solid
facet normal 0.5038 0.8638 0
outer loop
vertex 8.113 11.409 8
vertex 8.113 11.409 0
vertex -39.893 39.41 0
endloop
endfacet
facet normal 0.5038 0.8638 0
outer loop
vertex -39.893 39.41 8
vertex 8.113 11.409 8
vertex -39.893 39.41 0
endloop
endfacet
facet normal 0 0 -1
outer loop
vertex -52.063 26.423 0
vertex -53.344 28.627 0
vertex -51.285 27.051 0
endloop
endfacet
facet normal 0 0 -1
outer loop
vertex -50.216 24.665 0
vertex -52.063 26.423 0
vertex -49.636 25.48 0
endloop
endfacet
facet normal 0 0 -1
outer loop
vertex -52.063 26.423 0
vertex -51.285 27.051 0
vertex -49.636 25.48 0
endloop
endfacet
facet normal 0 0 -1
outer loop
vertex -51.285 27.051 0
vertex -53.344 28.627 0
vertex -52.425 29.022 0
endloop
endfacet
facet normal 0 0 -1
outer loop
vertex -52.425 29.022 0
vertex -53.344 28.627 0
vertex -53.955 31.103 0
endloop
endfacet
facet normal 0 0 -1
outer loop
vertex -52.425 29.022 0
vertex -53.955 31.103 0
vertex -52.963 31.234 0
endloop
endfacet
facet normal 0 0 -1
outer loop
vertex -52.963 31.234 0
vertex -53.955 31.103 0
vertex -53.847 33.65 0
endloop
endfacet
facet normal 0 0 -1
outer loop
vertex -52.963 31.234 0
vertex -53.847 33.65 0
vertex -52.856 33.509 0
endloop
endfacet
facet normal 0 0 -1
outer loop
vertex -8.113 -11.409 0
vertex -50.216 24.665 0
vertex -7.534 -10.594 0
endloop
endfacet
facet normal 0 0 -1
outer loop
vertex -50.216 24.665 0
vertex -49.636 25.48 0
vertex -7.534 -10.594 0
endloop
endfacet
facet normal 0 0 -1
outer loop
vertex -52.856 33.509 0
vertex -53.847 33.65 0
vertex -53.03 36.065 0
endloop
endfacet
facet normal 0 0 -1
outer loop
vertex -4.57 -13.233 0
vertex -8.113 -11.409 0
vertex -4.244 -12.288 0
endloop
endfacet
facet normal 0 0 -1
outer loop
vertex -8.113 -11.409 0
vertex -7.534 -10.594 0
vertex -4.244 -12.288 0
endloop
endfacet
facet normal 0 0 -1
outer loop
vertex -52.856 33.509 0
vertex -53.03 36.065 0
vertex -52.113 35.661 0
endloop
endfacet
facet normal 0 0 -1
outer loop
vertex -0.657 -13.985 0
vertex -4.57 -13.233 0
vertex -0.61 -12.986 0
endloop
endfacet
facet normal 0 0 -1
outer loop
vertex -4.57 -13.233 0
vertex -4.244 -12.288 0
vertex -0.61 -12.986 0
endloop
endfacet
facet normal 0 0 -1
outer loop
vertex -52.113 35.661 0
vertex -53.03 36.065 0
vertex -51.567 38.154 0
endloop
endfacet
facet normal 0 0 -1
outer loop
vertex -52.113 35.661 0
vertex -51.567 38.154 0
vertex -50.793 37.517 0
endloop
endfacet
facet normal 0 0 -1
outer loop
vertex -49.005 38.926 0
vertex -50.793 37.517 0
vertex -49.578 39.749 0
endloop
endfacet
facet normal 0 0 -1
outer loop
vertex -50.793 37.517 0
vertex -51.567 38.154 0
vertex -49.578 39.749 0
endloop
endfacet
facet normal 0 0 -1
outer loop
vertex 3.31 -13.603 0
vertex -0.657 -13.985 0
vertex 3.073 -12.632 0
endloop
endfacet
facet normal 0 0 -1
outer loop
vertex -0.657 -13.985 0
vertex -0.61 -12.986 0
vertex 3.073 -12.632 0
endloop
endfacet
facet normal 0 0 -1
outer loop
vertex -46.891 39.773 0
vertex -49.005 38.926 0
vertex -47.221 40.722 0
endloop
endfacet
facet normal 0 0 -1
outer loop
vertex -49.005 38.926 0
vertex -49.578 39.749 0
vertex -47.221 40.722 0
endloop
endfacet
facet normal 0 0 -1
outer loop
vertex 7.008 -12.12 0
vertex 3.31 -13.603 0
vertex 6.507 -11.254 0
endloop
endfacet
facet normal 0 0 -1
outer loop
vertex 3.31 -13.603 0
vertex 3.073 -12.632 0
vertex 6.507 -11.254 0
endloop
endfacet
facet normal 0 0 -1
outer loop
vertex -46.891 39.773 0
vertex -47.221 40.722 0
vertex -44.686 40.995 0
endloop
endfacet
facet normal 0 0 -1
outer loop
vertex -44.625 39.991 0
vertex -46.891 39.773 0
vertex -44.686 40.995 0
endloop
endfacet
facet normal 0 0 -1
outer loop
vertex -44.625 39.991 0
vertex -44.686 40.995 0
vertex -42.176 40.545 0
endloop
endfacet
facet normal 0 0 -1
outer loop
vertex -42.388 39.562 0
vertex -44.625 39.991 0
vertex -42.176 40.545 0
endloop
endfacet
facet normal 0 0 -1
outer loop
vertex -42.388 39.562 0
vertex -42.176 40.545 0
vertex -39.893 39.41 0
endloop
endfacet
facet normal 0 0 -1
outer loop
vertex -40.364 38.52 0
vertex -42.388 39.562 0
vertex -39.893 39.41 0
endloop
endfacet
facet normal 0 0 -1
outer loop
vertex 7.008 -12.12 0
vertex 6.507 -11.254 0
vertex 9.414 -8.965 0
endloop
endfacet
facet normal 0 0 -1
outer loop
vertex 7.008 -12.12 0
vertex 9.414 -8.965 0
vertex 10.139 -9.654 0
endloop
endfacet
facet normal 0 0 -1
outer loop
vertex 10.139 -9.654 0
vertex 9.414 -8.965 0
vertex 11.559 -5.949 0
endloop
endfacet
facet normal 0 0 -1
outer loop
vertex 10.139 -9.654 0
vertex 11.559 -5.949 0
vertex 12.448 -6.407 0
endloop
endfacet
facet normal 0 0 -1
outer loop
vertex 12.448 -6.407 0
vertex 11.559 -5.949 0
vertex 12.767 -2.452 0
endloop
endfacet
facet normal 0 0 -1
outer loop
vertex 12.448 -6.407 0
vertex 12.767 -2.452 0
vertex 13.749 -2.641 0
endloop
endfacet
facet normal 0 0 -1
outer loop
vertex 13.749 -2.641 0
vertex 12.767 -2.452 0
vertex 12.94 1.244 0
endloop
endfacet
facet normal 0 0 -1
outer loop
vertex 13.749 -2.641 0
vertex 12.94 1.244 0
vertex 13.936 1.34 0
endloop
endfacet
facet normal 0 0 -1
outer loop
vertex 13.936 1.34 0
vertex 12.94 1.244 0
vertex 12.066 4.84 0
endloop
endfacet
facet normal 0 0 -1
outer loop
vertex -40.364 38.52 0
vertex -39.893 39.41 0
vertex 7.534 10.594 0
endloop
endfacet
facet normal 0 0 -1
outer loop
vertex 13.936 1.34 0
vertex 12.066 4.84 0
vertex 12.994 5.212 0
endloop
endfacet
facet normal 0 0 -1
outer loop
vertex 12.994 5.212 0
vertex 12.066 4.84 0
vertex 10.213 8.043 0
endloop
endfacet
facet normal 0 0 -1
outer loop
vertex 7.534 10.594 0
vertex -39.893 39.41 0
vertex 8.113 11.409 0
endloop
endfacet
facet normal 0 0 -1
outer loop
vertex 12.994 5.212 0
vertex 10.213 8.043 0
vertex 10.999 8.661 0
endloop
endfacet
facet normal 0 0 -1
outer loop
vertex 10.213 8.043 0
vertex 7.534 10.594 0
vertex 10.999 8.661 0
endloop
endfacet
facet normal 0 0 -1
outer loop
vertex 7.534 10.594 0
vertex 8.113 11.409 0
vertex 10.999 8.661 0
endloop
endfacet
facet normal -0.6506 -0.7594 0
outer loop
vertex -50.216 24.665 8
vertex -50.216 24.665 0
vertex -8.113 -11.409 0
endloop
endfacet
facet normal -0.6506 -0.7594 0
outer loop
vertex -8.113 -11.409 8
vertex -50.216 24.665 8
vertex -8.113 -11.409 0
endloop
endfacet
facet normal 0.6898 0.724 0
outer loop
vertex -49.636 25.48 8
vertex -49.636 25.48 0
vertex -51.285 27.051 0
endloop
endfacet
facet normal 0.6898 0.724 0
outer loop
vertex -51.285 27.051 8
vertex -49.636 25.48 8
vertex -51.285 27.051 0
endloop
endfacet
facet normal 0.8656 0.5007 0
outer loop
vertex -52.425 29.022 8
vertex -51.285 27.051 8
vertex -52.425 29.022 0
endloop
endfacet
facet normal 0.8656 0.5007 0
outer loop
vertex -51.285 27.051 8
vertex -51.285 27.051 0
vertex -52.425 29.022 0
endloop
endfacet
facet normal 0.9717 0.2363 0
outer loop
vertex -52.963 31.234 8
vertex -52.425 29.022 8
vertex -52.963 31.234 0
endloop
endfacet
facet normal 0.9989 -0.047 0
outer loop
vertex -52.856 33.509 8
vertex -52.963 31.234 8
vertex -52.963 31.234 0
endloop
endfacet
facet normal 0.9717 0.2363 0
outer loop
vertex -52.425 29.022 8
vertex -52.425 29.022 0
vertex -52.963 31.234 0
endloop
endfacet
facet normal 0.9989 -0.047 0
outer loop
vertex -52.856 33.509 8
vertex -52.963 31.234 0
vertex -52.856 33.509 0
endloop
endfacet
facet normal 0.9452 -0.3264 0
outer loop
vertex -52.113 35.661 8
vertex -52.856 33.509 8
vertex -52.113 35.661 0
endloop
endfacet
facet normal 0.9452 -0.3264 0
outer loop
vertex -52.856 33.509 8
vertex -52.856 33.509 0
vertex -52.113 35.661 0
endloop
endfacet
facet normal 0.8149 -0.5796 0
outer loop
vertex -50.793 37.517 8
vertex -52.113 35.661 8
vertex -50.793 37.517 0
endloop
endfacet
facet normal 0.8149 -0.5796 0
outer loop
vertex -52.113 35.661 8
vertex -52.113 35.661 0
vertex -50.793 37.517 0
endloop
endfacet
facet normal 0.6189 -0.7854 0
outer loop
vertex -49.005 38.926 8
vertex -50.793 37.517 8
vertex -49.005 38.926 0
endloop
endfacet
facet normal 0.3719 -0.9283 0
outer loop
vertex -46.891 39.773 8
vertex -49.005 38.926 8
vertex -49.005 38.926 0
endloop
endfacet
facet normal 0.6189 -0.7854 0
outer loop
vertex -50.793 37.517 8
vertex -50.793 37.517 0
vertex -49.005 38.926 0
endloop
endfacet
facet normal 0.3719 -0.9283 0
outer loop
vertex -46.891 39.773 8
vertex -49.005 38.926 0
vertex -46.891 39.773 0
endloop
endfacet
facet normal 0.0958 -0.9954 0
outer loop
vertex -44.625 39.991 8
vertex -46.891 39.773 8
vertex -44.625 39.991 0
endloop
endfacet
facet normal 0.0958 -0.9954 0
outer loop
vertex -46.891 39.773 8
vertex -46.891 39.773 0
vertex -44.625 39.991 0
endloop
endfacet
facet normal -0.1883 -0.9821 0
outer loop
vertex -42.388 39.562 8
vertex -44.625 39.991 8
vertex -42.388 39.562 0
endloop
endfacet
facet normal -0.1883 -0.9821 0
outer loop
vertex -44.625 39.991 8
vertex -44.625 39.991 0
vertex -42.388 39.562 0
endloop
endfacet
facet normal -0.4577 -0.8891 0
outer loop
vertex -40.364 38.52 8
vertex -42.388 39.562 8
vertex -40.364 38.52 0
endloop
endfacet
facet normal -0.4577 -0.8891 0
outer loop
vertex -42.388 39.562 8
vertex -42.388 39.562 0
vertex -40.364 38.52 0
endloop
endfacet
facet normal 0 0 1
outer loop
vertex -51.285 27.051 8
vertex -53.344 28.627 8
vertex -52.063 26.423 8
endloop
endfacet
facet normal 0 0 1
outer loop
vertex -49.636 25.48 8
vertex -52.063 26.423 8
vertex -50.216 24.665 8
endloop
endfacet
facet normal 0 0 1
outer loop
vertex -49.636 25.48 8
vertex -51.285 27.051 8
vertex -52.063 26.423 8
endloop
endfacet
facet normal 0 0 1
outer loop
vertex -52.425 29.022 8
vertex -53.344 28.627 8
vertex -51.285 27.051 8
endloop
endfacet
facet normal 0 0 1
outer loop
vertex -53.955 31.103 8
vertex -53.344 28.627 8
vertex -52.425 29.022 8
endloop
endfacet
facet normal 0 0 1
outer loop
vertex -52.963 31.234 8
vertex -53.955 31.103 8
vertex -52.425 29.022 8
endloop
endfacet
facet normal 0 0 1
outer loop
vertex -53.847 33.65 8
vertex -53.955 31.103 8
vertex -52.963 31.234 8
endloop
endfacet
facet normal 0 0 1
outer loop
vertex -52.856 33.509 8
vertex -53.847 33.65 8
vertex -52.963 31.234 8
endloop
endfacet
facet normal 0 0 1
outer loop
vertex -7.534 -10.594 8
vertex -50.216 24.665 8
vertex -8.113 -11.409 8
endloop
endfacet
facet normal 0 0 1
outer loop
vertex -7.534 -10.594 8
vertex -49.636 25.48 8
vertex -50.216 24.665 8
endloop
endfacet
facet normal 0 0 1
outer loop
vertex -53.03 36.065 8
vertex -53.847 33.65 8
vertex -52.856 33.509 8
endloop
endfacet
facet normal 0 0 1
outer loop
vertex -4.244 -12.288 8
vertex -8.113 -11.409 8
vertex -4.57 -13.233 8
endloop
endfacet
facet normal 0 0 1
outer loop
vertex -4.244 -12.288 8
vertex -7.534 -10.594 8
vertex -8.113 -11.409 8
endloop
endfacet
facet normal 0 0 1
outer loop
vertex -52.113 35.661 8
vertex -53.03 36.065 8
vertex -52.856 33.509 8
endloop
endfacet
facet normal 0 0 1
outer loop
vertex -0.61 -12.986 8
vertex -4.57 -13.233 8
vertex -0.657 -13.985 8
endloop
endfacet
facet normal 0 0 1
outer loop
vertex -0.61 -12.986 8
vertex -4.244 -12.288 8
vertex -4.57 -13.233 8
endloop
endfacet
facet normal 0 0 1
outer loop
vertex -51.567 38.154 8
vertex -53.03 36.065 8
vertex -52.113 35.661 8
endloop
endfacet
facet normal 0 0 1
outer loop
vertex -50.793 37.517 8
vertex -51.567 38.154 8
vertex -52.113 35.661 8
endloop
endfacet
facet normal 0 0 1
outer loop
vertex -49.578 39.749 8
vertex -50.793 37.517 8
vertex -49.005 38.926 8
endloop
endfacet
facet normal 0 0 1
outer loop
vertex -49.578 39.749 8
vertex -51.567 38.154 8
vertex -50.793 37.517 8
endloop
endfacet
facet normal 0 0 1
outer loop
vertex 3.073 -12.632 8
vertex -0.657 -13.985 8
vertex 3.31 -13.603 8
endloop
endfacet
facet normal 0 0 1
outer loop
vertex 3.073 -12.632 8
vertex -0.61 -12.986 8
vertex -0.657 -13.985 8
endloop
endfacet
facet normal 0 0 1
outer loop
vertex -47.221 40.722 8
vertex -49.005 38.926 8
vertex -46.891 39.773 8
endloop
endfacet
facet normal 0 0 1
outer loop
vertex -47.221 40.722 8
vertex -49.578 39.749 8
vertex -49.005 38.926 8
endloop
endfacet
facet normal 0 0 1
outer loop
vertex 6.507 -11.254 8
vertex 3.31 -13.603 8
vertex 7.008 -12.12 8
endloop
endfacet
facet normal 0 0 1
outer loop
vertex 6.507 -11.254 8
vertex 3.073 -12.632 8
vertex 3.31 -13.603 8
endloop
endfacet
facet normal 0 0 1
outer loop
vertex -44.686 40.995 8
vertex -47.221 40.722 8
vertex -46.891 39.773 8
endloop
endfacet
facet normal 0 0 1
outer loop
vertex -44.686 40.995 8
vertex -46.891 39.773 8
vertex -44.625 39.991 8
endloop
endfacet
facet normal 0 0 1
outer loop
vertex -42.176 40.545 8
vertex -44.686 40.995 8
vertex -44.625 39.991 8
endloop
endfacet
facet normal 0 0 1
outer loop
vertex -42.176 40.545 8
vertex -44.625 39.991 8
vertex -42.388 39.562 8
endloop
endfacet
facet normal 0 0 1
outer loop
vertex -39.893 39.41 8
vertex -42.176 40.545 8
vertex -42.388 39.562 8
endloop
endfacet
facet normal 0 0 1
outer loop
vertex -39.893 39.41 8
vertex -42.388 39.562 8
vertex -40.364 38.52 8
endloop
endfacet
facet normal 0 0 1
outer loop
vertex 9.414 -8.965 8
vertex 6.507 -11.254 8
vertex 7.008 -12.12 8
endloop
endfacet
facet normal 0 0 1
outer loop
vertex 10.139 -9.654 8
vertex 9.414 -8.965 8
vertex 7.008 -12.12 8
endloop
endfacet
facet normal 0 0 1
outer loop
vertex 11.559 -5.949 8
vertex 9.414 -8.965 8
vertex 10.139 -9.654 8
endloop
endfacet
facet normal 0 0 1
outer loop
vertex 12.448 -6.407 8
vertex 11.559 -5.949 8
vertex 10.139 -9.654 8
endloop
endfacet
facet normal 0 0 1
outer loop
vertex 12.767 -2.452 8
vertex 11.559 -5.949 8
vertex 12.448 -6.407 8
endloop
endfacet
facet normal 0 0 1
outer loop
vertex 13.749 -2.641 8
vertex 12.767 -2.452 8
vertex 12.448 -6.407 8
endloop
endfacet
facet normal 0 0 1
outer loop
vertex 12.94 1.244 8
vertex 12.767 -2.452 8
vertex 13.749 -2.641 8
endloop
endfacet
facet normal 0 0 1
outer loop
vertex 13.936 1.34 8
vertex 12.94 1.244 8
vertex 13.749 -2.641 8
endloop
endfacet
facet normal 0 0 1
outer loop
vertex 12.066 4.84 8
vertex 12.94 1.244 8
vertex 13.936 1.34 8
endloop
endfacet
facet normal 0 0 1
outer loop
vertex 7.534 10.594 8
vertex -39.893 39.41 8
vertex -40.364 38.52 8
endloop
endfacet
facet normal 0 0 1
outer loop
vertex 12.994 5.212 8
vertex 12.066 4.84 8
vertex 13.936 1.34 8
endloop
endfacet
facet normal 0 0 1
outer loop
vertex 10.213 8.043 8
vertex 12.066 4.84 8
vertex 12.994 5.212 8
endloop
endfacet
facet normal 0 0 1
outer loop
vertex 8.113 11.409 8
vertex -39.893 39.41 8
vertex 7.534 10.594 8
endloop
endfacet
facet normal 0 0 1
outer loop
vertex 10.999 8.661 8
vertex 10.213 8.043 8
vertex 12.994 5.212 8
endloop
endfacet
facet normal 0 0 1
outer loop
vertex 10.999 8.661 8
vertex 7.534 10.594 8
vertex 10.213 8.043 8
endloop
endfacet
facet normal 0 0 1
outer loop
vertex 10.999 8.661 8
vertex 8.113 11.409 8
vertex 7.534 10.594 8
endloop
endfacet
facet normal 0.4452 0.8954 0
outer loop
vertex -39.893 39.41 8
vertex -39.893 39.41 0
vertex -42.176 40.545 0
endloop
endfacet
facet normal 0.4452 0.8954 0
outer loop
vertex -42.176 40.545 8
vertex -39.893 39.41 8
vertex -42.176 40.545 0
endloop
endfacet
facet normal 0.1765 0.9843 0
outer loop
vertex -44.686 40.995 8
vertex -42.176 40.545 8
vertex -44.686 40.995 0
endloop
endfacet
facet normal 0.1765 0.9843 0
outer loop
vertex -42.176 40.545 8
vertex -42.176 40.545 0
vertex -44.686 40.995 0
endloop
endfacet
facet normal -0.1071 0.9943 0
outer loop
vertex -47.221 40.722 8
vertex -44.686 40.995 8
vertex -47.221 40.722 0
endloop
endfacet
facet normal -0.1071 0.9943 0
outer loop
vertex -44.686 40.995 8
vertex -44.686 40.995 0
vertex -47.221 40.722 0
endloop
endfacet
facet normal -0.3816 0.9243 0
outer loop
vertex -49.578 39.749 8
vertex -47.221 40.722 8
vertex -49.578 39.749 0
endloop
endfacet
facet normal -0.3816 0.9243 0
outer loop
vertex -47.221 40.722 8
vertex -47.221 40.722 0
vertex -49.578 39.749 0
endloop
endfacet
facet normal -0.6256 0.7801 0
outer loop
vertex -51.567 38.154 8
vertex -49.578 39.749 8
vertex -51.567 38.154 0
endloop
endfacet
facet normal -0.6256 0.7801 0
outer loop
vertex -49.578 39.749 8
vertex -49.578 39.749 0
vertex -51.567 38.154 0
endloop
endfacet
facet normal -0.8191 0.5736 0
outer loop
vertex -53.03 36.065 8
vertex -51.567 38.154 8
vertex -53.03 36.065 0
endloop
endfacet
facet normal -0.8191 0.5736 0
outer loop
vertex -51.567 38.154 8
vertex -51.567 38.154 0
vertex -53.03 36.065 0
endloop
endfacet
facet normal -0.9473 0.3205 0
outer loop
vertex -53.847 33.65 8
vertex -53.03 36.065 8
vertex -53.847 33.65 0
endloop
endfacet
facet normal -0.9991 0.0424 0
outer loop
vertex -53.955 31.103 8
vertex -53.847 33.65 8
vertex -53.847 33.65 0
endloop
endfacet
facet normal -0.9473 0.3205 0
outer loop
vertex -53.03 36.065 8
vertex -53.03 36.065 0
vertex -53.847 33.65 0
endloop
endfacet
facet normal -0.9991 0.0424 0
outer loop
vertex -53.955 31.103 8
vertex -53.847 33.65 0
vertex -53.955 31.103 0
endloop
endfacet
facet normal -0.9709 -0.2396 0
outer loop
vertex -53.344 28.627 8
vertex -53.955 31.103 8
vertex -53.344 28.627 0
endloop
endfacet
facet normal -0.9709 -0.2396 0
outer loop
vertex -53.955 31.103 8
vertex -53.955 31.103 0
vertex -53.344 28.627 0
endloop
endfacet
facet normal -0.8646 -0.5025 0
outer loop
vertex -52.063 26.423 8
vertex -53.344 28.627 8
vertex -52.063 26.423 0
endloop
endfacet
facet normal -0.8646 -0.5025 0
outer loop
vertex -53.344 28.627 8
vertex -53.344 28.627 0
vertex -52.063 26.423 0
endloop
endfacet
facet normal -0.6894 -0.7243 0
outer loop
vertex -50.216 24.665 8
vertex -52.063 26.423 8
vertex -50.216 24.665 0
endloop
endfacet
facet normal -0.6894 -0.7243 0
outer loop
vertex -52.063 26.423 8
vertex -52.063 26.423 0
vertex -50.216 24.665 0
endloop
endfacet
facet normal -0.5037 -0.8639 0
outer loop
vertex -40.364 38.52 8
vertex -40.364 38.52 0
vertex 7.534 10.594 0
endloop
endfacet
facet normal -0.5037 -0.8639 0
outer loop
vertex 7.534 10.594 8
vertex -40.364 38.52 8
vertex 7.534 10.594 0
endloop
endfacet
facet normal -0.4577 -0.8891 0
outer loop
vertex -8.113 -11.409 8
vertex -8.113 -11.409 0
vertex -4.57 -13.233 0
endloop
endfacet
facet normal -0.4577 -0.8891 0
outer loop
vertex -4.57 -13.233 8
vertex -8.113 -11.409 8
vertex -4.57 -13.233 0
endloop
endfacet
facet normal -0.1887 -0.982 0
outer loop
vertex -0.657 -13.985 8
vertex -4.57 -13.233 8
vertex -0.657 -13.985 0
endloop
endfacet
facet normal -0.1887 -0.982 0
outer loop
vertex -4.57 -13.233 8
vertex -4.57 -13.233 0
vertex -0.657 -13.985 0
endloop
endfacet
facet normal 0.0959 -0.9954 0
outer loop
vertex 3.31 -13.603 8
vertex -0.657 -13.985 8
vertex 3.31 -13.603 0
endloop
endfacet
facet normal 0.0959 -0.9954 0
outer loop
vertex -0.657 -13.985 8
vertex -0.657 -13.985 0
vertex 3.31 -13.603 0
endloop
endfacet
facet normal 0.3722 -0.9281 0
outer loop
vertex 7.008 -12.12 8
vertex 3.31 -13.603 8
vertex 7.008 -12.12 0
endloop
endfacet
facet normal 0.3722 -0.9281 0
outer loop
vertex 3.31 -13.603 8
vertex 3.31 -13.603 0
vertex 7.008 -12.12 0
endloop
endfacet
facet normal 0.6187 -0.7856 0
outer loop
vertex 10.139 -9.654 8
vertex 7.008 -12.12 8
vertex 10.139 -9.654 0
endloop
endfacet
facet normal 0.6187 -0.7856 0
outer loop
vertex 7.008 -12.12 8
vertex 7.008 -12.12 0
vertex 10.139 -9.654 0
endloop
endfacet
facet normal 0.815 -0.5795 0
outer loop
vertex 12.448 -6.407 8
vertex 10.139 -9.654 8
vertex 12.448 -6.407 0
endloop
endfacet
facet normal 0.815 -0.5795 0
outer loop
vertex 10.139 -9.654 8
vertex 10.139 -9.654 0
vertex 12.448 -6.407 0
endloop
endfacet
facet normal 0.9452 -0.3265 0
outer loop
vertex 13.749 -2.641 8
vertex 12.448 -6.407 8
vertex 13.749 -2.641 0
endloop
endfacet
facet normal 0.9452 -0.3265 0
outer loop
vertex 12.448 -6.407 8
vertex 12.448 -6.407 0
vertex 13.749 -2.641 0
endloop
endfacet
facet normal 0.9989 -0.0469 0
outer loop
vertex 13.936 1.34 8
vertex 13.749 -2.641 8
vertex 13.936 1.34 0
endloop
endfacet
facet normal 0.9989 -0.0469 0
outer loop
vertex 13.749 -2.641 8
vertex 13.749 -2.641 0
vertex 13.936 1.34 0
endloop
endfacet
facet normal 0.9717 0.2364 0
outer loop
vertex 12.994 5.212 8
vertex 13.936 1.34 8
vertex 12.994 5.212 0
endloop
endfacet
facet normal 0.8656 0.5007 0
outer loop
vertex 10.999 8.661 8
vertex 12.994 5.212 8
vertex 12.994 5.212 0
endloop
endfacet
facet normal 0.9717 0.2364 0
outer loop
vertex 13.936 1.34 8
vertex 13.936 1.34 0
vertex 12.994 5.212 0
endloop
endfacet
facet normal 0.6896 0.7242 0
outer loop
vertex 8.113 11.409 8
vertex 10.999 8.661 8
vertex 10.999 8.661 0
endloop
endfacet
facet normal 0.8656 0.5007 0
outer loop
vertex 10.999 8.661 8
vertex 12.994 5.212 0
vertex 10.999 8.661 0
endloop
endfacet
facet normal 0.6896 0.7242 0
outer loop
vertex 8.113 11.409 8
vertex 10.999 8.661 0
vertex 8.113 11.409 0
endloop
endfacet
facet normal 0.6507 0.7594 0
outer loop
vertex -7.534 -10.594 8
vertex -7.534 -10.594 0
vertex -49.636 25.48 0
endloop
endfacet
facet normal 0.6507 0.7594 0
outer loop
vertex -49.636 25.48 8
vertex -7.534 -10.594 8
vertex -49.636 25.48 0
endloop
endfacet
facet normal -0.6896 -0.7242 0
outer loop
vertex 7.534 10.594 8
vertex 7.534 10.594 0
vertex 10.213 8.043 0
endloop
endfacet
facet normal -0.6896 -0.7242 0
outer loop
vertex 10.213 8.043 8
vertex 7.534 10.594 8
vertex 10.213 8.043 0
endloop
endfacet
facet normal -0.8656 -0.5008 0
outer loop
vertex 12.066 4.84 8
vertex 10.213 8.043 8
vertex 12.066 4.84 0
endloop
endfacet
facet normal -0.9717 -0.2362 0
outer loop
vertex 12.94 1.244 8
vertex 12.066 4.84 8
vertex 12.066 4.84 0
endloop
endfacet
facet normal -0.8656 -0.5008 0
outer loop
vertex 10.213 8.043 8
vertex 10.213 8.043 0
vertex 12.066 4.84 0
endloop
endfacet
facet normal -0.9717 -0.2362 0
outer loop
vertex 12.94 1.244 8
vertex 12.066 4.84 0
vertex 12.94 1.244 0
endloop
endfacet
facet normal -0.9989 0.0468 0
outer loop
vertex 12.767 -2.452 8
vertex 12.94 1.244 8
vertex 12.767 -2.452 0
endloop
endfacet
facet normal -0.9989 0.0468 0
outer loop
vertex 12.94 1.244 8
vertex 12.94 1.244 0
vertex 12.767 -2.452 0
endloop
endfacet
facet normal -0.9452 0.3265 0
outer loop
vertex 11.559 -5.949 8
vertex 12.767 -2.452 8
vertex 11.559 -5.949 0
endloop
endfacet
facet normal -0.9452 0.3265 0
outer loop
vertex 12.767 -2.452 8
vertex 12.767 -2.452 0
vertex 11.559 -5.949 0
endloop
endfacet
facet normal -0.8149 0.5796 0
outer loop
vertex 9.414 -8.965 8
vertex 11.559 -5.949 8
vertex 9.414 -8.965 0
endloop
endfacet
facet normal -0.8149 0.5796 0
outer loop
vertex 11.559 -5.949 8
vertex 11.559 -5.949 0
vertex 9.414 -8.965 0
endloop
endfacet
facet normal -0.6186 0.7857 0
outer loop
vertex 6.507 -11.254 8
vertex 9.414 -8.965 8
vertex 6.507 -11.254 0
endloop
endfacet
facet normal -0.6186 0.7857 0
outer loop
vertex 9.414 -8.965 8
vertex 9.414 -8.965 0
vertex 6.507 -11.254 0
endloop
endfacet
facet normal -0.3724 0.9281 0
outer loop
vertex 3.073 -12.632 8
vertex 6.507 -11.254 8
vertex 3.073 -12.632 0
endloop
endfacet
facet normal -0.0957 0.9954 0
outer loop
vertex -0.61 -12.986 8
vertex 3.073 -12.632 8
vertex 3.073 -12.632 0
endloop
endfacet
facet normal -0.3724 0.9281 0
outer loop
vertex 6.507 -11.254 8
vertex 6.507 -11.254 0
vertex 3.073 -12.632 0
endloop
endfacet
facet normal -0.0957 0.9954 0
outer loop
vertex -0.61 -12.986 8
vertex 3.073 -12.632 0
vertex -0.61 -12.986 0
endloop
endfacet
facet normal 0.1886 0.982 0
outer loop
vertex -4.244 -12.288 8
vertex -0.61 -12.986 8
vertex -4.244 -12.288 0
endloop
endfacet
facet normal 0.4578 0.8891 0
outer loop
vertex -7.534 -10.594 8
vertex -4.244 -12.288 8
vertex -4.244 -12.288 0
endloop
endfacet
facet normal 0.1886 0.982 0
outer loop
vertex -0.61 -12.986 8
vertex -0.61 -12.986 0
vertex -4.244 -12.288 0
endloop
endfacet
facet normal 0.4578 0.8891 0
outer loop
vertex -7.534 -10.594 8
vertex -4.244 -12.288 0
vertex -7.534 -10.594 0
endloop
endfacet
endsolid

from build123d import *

# Parameters (mm, degrees)
BOSS_EXTRU_1_DEPTH = 8


with BuildPart() as part:
    # Esquisse1 → Boss.-Extru.1 (new body)
    with BuildSketch(Plane.XY):
        with BuildLine():
            Line((8.113333009, 11.409374544), (-39.892627503, 39.410448447))
            ThreePointArc((-39.892627503, 39.410448447), (-52.372722195, 37.161682616), (-50.215714077, 24.665402079))
            Line((-50.215714077, 24.665402079), (-8.113333009, -11.409374544))
            ThreePointArc((-8.113333009, -11.409374544), (11.409374544, -8.113333009), (8.113333009, 11.409374544))
        make_face()
        with BuildLine():
            ThreePointArc((-49.636190291, 25.480357403), (-51.519642597, 36.636190291), (-40.363809709, 38.519642597))
            Line((-40.363809709, 38.519642597), (7.533809223, 10.594419219))
            ThreePointArc((7.533809223, 10.594419219), (10.594419219, -7.533809223), (-7.533809223, -10.594419219))
            Line((-7.533809223, -10.594419219), (-49.636190291, 25.480357403))
        make_face(mode=Mode.SUBTRACT)
    extrude(amount=BOSS_EXTRU_1_DEPTH)


solid = part.part
